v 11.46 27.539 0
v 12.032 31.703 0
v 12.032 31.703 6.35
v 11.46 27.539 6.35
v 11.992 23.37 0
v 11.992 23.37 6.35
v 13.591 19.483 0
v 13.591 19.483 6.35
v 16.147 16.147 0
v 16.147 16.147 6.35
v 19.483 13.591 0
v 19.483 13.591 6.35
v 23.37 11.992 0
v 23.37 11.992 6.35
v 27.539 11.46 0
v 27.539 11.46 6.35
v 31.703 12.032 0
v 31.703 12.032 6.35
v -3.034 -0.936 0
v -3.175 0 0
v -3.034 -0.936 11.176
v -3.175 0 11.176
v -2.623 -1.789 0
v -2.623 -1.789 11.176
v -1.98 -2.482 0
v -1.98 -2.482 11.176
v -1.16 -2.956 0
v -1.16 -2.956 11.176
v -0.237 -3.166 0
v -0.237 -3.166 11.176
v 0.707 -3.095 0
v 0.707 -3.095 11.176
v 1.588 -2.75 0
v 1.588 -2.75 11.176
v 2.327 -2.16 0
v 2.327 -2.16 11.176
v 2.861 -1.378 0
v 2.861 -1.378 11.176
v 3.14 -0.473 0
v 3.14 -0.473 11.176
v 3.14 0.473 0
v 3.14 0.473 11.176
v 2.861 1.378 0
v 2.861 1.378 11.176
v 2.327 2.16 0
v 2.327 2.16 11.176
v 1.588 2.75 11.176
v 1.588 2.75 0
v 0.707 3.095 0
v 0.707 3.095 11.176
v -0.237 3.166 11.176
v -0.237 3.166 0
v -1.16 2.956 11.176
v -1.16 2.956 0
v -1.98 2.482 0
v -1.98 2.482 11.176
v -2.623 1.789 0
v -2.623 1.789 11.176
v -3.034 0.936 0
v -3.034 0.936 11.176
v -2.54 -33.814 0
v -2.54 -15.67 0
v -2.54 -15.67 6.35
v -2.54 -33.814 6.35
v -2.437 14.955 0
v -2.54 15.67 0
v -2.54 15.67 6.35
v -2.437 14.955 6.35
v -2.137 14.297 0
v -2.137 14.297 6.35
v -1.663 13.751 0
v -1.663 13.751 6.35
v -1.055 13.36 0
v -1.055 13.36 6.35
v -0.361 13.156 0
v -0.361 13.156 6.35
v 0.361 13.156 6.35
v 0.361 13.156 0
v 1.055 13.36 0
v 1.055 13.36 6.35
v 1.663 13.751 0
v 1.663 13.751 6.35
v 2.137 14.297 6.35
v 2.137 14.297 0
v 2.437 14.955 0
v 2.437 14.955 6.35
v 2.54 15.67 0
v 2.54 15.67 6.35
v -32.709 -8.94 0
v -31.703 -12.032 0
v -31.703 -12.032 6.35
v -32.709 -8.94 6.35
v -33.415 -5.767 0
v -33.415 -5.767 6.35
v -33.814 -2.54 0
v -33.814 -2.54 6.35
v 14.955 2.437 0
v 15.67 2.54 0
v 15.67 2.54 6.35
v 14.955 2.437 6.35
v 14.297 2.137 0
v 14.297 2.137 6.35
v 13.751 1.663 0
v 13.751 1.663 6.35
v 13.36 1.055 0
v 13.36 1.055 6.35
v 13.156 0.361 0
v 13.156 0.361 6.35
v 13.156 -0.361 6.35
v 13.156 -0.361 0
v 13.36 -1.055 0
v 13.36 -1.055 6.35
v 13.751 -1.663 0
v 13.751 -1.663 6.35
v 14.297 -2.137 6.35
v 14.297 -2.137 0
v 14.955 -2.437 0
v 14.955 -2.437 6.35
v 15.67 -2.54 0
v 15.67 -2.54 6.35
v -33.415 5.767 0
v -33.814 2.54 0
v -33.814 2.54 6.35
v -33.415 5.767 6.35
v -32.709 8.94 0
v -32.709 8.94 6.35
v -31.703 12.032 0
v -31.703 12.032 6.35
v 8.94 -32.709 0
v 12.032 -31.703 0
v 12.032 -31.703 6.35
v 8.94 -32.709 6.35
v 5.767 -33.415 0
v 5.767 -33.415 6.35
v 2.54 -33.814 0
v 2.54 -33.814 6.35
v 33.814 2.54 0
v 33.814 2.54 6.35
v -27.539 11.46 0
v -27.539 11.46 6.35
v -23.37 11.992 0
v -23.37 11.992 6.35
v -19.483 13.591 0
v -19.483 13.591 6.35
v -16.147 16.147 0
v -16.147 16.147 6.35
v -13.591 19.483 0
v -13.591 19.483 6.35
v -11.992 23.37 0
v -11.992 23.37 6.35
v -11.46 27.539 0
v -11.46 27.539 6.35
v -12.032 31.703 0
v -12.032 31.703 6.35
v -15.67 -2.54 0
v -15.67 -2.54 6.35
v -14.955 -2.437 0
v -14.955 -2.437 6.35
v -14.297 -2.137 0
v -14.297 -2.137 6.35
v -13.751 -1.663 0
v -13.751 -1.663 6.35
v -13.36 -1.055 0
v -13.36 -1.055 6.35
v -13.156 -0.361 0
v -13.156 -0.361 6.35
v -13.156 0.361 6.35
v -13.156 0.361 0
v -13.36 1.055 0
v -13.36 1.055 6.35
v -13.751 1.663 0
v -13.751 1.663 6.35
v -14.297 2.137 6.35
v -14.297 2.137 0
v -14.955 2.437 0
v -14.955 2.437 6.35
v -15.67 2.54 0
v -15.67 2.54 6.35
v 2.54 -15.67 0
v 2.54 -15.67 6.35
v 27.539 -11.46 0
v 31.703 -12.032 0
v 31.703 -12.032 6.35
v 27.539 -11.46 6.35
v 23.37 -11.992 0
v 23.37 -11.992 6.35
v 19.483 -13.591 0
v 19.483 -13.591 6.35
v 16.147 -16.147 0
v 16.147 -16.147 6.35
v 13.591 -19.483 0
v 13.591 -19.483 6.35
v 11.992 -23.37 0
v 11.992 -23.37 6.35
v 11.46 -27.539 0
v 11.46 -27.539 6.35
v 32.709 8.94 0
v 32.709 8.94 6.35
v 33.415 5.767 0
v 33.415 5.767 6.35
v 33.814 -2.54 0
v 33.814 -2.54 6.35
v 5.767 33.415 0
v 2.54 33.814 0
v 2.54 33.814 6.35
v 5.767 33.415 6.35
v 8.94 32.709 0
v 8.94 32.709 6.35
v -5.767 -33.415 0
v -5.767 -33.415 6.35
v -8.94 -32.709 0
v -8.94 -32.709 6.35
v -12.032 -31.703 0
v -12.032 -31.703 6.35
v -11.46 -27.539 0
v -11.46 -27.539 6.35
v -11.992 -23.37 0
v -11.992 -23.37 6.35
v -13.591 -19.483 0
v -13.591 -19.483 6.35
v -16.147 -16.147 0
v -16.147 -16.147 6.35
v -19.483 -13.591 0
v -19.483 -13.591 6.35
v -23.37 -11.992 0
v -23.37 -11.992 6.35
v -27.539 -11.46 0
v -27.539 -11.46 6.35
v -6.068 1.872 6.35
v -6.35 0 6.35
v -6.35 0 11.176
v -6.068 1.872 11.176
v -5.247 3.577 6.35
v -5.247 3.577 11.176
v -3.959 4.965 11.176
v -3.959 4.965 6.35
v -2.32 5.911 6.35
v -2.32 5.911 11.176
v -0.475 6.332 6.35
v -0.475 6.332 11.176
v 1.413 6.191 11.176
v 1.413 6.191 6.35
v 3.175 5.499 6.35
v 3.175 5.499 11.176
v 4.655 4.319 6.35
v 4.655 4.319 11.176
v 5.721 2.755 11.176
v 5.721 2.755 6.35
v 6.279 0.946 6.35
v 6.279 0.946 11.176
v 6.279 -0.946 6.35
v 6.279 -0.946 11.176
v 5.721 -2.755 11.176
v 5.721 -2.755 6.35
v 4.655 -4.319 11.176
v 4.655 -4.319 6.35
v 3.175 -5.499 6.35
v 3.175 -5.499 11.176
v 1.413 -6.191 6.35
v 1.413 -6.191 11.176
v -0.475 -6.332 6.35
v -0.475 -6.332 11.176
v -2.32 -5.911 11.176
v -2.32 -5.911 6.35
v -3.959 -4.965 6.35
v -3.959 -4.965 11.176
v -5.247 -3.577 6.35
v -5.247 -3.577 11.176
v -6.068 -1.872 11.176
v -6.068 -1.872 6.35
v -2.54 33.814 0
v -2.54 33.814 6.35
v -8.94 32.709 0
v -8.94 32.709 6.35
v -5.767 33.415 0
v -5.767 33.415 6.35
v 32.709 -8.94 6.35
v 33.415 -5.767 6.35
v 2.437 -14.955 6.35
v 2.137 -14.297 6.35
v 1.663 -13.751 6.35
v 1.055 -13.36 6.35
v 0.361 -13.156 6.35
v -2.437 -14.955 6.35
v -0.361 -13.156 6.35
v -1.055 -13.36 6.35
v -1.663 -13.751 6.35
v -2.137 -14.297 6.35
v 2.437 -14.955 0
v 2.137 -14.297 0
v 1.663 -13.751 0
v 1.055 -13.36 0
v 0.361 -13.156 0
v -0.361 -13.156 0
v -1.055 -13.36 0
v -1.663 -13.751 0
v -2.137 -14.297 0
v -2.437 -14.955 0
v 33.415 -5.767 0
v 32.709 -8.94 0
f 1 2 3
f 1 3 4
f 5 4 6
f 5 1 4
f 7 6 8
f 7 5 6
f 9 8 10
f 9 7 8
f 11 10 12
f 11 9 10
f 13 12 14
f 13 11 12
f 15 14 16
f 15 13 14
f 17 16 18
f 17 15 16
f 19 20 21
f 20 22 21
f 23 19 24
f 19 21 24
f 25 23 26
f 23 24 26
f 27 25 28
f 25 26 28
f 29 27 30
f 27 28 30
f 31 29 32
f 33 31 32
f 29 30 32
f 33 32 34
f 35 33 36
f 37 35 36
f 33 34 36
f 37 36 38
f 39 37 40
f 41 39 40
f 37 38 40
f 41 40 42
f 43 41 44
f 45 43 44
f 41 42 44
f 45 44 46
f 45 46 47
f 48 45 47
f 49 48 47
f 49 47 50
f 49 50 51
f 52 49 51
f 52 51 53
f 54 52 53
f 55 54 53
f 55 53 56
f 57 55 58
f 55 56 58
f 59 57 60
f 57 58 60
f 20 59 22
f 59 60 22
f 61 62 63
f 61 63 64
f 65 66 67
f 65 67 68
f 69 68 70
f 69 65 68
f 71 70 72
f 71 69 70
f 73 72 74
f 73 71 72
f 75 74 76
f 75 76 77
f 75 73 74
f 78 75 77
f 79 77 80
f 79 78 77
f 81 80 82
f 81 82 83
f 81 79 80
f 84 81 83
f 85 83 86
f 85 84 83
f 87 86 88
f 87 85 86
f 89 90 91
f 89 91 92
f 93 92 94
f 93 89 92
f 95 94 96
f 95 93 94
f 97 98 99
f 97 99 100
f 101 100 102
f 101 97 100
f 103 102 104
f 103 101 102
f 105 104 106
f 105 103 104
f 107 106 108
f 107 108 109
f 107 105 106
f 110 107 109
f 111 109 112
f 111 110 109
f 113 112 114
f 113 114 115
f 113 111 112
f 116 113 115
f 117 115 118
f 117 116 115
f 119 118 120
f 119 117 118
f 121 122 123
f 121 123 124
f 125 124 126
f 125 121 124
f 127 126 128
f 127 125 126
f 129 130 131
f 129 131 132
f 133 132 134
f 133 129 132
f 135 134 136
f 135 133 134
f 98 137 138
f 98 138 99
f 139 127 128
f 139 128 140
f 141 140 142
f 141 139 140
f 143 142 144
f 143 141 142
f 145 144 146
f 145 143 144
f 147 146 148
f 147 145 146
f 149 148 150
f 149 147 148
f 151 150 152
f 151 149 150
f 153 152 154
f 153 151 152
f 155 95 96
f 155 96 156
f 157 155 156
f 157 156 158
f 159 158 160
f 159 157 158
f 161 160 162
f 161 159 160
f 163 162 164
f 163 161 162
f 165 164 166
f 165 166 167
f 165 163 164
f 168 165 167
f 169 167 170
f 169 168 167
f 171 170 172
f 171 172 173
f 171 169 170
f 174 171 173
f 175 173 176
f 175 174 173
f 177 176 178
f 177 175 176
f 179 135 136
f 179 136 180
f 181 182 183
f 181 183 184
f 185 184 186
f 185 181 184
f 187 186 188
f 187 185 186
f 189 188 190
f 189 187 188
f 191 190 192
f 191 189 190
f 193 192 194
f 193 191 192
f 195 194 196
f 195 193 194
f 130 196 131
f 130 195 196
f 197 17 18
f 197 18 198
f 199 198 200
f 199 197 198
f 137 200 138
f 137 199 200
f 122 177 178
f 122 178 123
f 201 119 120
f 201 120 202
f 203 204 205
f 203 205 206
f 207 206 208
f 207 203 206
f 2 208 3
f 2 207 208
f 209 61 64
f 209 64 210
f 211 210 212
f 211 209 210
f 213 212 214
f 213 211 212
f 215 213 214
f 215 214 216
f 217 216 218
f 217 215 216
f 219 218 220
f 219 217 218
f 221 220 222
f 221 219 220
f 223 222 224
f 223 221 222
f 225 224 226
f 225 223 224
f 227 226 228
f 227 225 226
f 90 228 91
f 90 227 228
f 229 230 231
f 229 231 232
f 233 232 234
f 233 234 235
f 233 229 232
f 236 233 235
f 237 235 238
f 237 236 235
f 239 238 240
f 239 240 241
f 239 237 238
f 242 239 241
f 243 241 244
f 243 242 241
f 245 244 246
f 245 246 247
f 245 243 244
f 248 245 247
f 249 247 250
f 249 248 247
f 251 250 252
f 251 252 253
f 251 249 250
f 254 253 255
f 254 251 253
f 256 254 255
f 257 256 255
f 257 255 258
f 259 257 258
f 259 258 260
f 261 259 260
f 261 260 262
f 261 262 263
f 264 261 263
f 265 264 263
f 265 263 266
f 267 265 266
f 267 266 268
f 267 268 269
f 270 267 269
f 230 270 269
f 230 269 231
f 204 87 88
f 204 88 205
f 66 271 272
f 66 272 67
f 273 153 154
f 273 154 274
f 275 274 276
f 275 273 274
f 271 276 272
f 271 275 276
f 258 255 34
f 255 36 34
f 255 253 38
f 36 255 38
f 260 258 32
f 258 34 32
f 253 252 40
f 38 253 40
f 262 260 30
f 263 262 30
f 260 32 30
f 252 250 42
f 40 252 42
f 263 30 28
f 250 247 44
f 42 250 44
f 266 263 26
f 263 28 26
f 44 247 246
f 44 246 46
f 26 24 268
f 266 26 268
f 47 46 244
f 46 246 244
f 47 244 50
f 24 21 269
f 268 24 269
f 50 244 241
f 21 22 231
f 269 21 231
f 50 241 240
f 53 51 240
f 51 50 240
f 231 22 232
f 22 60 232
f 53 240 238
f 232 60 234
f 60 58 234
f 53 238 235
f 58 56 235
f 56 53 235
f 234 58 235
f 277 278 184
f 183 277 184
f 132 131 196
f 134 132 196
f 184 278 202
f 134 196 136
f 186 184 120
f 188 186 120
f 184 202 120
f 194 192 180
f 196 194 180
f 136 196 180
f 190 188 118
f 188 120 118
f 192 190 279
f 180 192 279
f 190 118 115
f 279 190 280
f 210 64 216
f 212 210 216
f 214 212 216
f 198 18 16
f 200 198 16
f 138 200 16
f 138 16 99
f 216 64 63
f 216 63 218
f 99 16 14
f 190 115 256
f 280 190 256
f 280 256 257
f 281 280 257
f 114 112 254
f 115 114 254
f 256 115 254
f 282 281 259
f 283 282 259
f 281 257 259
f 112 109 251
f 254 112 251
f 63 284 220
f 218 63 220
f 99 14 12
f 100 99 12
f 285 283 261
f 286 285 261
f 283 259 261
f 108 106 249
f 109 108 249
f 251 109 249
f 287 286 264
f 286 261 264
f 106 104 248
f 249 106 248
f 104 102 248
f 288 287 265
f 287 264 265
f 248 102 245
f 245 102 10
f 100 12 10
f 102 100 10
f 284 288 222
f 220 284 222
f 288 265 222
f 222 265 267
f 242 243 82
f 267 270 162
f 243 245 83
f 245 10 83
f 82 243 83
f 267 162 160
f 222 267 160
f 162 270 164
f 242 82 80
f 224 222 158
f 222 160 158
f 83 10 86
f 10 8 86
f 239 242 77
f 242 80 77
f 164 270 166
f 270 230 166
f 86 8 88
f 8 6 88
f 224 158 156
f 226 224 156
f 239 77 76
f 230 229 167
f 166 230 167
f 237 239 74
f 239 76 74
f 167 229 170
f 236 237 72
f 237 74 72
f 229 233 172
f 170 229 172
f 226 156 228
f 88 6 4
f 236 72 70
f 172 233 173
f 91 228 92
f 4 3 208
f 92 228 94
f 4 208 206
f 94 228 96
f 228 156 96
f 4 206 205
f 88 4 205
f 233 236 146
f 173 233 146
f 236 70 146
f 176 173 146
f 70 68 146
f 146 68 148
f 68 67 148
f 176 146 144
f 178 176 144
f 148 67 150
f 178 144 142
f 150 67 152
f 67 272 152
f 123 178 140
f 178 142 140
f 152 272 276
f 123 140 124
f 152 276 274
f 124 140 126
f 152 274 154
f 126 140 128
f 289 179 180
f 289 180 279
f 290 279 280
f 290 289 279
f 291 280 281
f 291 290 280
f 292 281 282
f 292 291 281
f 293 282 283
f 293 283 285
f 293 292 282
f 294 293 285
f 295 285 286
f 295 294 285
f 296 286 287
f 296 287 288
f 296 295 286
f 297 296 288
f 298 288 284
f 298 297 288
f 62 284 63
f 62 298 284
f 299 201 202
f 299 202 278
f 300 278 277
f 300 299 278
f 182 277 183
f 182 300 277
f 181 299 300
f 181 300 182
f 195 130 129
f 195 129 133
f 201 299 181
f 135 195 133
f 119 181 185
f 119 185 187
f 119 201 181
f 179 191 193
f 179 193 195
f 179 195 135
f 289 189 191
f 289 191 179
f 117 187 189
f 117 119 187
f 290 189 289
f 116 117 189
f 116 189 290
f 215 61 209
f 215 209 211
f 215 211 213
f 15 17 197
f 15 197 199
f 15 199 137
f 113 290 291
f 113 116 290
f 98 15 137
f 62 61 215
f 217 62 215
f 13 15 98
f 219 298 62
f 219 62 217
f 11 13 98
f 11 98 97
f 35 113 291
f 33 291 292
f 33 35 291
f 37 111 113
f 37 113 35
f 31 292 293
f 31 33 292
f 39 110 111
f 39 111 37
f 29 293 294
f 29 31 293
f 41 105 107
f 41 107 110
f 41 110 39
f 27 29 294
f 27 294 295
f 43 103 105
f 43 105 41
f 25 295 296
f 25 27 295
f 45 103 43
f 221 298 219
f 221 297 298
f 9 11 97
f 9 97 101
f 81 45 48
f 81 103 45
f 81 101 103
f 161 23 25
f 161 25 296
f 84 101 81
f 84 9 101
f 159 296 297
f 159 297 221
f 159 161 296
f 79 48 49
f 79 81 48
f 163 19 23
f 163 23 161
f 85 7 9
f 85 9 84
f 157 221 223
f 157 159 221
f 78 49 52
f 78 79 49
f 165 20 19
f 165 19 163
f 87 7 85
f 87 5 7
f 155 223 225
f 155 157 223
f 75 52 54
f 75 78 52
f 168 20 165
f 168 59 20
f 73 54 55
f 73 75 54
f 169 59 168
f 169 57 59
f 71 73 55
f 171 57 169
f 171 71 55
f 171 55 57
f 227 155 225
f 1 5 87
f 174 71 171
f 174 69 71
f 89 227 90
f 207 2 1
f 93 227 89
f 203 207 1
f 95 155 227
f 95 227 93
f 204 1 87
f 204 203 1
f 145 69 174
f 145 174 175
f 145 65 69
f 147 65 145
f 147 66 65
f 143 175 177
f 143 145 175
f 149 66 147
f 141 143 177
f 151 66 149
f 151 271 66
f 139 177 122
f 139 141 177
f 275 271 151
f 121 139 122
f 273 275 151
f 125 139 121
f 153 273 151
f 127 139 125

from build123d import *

# Parameters (mm, degrees)
BOSS_EXTRUDE1_DEPTH = 6.35
SKETCH2_R           = 6.35
SKETCH2_R_2         = 3.175
BOSS_EXTRUDE2_DEPTH = 11.176
SKETCH3_R           = 3.175
CUT_EXTRUDE1_DEPTH  = 49.23960885


with BuildPart() as part:
    # Sketch1 → Boss-Extrude1 (new body)
    with BuildSketch(Plane.XY):
        with BuildLine():
            Line((15.670482603, -2.54), (33.813735094, -2.54))
            ThreePointArc((33.813735094, -2.54), (33.100172266, -7.361988656), (31.702602715, -12.03184367))
            ThreePointArc((31.702602715, -12.03184367), (16.146500506, -16.146500506), (12.03184367, -31.702602715))
            ThreePointArc((12.03184367, -31.702602715), (7.361988656, -33.100172266), (2.54, -33.813735094))
            Line((2.54, -33.813735094), (2.54, -15.670482603))
            ThreePointArc((2.54, -15.670482603), (0, -13.130482603), (-2.54, -15.670482603))
            Line((-2.54, -15.670482603), (-2.54, -33.813735094))
            ThreePointArc((-2.54, -33.813735094), (-7.361988656, -33.100172266), (-12.03184367, -31.702602715))
            ThreePointArc((-12.03184367, -31.702602715), (-16.146500506, -16.146500506), (-31.702602715, -12.03184367))
            ThreePointArc((-31.702602715, -12.03184367), (-33.100172266, -7.361988656), (-33.813735094, -2.54))
            Line((-33.813735094, -2.54), (-15.670482603, -2.54))
            ThreePointArc((-15.670482603, -2.54), (-13.130482603, 0), (-15.670482603, 2.54))
            Line((-15.670482603, 2.54), (-33.813735094, 2.54))
            ThreePointArc((-33.813735094, 2.54), (-33.100172266, 7.361988656), (-31.702602715, 12.03184367))
            ThreePointArc((-31.702602715, 12.03184367), (-16.146500506, 16.146500506), (-12.03184367, 31.702602715))
            ThreePointArc((-12.03184367, 31.702602715), (-7.361988656, 33.100172266), (-2.54, 33.813735094))
            Line((-2.54, 33.813735094), (-2.54, 15.670482603))
            ThreePointArc((-2.54, 15.670482603), (0, 13.130482603), (2.54, 15.670482603))
            Line((2.54, 15.670482603), (2.54, 33.813735094))
            ThreePointArc((2.54, 33.813735094), (7.361988656, 33.100172266), (12.03184367, 31.702602715))
            ThreePointArc((12.03184367, 31.702602715), (16.146500506, 16.146500506), (31.702602715, 12.03184367))
            ThreePointArc((31.702602715, 12.03184367), (33.100172266, 7.361988656), (33.813735094, 2.54))
            Line((33.813735094, 2.54), (15.670482603, 2.54))
            ThreePointArc((15.670482603, 2.54), (13.130482603, 0), (15.670482603, -2.54))
        make_face()
    extrude(amount=BOSS_EXTRUDE1_DEPTH)

    # Sketch2 → Boss-Extrude2 (add)
    with BuildSketch(Plane(origin=(0, 0, 0), x_dir=(-1, 0, 0), z_dir=(0, 0, -1))):
        Circle(SKETCH2_R)
        Circle(SKETCH2_R_2, mode=Mode.SUBTRACT)
    extrude(amount=-BOSS_EXTRUDE2_DEPTH)

    # Sketch3 → Cut-Extrude1 (cut, through all)
    with BuildSketch(Plane.XY.offset(6.35)):
        with Locations(Location((0, 0, 0), (0, 0, 180))):
            Circle(SKETCH3_R)
    extrude(amount=-CUT_EXTRUDE1_DEPTH, mode=Mode.SUBTRACT)


solid = part.part
